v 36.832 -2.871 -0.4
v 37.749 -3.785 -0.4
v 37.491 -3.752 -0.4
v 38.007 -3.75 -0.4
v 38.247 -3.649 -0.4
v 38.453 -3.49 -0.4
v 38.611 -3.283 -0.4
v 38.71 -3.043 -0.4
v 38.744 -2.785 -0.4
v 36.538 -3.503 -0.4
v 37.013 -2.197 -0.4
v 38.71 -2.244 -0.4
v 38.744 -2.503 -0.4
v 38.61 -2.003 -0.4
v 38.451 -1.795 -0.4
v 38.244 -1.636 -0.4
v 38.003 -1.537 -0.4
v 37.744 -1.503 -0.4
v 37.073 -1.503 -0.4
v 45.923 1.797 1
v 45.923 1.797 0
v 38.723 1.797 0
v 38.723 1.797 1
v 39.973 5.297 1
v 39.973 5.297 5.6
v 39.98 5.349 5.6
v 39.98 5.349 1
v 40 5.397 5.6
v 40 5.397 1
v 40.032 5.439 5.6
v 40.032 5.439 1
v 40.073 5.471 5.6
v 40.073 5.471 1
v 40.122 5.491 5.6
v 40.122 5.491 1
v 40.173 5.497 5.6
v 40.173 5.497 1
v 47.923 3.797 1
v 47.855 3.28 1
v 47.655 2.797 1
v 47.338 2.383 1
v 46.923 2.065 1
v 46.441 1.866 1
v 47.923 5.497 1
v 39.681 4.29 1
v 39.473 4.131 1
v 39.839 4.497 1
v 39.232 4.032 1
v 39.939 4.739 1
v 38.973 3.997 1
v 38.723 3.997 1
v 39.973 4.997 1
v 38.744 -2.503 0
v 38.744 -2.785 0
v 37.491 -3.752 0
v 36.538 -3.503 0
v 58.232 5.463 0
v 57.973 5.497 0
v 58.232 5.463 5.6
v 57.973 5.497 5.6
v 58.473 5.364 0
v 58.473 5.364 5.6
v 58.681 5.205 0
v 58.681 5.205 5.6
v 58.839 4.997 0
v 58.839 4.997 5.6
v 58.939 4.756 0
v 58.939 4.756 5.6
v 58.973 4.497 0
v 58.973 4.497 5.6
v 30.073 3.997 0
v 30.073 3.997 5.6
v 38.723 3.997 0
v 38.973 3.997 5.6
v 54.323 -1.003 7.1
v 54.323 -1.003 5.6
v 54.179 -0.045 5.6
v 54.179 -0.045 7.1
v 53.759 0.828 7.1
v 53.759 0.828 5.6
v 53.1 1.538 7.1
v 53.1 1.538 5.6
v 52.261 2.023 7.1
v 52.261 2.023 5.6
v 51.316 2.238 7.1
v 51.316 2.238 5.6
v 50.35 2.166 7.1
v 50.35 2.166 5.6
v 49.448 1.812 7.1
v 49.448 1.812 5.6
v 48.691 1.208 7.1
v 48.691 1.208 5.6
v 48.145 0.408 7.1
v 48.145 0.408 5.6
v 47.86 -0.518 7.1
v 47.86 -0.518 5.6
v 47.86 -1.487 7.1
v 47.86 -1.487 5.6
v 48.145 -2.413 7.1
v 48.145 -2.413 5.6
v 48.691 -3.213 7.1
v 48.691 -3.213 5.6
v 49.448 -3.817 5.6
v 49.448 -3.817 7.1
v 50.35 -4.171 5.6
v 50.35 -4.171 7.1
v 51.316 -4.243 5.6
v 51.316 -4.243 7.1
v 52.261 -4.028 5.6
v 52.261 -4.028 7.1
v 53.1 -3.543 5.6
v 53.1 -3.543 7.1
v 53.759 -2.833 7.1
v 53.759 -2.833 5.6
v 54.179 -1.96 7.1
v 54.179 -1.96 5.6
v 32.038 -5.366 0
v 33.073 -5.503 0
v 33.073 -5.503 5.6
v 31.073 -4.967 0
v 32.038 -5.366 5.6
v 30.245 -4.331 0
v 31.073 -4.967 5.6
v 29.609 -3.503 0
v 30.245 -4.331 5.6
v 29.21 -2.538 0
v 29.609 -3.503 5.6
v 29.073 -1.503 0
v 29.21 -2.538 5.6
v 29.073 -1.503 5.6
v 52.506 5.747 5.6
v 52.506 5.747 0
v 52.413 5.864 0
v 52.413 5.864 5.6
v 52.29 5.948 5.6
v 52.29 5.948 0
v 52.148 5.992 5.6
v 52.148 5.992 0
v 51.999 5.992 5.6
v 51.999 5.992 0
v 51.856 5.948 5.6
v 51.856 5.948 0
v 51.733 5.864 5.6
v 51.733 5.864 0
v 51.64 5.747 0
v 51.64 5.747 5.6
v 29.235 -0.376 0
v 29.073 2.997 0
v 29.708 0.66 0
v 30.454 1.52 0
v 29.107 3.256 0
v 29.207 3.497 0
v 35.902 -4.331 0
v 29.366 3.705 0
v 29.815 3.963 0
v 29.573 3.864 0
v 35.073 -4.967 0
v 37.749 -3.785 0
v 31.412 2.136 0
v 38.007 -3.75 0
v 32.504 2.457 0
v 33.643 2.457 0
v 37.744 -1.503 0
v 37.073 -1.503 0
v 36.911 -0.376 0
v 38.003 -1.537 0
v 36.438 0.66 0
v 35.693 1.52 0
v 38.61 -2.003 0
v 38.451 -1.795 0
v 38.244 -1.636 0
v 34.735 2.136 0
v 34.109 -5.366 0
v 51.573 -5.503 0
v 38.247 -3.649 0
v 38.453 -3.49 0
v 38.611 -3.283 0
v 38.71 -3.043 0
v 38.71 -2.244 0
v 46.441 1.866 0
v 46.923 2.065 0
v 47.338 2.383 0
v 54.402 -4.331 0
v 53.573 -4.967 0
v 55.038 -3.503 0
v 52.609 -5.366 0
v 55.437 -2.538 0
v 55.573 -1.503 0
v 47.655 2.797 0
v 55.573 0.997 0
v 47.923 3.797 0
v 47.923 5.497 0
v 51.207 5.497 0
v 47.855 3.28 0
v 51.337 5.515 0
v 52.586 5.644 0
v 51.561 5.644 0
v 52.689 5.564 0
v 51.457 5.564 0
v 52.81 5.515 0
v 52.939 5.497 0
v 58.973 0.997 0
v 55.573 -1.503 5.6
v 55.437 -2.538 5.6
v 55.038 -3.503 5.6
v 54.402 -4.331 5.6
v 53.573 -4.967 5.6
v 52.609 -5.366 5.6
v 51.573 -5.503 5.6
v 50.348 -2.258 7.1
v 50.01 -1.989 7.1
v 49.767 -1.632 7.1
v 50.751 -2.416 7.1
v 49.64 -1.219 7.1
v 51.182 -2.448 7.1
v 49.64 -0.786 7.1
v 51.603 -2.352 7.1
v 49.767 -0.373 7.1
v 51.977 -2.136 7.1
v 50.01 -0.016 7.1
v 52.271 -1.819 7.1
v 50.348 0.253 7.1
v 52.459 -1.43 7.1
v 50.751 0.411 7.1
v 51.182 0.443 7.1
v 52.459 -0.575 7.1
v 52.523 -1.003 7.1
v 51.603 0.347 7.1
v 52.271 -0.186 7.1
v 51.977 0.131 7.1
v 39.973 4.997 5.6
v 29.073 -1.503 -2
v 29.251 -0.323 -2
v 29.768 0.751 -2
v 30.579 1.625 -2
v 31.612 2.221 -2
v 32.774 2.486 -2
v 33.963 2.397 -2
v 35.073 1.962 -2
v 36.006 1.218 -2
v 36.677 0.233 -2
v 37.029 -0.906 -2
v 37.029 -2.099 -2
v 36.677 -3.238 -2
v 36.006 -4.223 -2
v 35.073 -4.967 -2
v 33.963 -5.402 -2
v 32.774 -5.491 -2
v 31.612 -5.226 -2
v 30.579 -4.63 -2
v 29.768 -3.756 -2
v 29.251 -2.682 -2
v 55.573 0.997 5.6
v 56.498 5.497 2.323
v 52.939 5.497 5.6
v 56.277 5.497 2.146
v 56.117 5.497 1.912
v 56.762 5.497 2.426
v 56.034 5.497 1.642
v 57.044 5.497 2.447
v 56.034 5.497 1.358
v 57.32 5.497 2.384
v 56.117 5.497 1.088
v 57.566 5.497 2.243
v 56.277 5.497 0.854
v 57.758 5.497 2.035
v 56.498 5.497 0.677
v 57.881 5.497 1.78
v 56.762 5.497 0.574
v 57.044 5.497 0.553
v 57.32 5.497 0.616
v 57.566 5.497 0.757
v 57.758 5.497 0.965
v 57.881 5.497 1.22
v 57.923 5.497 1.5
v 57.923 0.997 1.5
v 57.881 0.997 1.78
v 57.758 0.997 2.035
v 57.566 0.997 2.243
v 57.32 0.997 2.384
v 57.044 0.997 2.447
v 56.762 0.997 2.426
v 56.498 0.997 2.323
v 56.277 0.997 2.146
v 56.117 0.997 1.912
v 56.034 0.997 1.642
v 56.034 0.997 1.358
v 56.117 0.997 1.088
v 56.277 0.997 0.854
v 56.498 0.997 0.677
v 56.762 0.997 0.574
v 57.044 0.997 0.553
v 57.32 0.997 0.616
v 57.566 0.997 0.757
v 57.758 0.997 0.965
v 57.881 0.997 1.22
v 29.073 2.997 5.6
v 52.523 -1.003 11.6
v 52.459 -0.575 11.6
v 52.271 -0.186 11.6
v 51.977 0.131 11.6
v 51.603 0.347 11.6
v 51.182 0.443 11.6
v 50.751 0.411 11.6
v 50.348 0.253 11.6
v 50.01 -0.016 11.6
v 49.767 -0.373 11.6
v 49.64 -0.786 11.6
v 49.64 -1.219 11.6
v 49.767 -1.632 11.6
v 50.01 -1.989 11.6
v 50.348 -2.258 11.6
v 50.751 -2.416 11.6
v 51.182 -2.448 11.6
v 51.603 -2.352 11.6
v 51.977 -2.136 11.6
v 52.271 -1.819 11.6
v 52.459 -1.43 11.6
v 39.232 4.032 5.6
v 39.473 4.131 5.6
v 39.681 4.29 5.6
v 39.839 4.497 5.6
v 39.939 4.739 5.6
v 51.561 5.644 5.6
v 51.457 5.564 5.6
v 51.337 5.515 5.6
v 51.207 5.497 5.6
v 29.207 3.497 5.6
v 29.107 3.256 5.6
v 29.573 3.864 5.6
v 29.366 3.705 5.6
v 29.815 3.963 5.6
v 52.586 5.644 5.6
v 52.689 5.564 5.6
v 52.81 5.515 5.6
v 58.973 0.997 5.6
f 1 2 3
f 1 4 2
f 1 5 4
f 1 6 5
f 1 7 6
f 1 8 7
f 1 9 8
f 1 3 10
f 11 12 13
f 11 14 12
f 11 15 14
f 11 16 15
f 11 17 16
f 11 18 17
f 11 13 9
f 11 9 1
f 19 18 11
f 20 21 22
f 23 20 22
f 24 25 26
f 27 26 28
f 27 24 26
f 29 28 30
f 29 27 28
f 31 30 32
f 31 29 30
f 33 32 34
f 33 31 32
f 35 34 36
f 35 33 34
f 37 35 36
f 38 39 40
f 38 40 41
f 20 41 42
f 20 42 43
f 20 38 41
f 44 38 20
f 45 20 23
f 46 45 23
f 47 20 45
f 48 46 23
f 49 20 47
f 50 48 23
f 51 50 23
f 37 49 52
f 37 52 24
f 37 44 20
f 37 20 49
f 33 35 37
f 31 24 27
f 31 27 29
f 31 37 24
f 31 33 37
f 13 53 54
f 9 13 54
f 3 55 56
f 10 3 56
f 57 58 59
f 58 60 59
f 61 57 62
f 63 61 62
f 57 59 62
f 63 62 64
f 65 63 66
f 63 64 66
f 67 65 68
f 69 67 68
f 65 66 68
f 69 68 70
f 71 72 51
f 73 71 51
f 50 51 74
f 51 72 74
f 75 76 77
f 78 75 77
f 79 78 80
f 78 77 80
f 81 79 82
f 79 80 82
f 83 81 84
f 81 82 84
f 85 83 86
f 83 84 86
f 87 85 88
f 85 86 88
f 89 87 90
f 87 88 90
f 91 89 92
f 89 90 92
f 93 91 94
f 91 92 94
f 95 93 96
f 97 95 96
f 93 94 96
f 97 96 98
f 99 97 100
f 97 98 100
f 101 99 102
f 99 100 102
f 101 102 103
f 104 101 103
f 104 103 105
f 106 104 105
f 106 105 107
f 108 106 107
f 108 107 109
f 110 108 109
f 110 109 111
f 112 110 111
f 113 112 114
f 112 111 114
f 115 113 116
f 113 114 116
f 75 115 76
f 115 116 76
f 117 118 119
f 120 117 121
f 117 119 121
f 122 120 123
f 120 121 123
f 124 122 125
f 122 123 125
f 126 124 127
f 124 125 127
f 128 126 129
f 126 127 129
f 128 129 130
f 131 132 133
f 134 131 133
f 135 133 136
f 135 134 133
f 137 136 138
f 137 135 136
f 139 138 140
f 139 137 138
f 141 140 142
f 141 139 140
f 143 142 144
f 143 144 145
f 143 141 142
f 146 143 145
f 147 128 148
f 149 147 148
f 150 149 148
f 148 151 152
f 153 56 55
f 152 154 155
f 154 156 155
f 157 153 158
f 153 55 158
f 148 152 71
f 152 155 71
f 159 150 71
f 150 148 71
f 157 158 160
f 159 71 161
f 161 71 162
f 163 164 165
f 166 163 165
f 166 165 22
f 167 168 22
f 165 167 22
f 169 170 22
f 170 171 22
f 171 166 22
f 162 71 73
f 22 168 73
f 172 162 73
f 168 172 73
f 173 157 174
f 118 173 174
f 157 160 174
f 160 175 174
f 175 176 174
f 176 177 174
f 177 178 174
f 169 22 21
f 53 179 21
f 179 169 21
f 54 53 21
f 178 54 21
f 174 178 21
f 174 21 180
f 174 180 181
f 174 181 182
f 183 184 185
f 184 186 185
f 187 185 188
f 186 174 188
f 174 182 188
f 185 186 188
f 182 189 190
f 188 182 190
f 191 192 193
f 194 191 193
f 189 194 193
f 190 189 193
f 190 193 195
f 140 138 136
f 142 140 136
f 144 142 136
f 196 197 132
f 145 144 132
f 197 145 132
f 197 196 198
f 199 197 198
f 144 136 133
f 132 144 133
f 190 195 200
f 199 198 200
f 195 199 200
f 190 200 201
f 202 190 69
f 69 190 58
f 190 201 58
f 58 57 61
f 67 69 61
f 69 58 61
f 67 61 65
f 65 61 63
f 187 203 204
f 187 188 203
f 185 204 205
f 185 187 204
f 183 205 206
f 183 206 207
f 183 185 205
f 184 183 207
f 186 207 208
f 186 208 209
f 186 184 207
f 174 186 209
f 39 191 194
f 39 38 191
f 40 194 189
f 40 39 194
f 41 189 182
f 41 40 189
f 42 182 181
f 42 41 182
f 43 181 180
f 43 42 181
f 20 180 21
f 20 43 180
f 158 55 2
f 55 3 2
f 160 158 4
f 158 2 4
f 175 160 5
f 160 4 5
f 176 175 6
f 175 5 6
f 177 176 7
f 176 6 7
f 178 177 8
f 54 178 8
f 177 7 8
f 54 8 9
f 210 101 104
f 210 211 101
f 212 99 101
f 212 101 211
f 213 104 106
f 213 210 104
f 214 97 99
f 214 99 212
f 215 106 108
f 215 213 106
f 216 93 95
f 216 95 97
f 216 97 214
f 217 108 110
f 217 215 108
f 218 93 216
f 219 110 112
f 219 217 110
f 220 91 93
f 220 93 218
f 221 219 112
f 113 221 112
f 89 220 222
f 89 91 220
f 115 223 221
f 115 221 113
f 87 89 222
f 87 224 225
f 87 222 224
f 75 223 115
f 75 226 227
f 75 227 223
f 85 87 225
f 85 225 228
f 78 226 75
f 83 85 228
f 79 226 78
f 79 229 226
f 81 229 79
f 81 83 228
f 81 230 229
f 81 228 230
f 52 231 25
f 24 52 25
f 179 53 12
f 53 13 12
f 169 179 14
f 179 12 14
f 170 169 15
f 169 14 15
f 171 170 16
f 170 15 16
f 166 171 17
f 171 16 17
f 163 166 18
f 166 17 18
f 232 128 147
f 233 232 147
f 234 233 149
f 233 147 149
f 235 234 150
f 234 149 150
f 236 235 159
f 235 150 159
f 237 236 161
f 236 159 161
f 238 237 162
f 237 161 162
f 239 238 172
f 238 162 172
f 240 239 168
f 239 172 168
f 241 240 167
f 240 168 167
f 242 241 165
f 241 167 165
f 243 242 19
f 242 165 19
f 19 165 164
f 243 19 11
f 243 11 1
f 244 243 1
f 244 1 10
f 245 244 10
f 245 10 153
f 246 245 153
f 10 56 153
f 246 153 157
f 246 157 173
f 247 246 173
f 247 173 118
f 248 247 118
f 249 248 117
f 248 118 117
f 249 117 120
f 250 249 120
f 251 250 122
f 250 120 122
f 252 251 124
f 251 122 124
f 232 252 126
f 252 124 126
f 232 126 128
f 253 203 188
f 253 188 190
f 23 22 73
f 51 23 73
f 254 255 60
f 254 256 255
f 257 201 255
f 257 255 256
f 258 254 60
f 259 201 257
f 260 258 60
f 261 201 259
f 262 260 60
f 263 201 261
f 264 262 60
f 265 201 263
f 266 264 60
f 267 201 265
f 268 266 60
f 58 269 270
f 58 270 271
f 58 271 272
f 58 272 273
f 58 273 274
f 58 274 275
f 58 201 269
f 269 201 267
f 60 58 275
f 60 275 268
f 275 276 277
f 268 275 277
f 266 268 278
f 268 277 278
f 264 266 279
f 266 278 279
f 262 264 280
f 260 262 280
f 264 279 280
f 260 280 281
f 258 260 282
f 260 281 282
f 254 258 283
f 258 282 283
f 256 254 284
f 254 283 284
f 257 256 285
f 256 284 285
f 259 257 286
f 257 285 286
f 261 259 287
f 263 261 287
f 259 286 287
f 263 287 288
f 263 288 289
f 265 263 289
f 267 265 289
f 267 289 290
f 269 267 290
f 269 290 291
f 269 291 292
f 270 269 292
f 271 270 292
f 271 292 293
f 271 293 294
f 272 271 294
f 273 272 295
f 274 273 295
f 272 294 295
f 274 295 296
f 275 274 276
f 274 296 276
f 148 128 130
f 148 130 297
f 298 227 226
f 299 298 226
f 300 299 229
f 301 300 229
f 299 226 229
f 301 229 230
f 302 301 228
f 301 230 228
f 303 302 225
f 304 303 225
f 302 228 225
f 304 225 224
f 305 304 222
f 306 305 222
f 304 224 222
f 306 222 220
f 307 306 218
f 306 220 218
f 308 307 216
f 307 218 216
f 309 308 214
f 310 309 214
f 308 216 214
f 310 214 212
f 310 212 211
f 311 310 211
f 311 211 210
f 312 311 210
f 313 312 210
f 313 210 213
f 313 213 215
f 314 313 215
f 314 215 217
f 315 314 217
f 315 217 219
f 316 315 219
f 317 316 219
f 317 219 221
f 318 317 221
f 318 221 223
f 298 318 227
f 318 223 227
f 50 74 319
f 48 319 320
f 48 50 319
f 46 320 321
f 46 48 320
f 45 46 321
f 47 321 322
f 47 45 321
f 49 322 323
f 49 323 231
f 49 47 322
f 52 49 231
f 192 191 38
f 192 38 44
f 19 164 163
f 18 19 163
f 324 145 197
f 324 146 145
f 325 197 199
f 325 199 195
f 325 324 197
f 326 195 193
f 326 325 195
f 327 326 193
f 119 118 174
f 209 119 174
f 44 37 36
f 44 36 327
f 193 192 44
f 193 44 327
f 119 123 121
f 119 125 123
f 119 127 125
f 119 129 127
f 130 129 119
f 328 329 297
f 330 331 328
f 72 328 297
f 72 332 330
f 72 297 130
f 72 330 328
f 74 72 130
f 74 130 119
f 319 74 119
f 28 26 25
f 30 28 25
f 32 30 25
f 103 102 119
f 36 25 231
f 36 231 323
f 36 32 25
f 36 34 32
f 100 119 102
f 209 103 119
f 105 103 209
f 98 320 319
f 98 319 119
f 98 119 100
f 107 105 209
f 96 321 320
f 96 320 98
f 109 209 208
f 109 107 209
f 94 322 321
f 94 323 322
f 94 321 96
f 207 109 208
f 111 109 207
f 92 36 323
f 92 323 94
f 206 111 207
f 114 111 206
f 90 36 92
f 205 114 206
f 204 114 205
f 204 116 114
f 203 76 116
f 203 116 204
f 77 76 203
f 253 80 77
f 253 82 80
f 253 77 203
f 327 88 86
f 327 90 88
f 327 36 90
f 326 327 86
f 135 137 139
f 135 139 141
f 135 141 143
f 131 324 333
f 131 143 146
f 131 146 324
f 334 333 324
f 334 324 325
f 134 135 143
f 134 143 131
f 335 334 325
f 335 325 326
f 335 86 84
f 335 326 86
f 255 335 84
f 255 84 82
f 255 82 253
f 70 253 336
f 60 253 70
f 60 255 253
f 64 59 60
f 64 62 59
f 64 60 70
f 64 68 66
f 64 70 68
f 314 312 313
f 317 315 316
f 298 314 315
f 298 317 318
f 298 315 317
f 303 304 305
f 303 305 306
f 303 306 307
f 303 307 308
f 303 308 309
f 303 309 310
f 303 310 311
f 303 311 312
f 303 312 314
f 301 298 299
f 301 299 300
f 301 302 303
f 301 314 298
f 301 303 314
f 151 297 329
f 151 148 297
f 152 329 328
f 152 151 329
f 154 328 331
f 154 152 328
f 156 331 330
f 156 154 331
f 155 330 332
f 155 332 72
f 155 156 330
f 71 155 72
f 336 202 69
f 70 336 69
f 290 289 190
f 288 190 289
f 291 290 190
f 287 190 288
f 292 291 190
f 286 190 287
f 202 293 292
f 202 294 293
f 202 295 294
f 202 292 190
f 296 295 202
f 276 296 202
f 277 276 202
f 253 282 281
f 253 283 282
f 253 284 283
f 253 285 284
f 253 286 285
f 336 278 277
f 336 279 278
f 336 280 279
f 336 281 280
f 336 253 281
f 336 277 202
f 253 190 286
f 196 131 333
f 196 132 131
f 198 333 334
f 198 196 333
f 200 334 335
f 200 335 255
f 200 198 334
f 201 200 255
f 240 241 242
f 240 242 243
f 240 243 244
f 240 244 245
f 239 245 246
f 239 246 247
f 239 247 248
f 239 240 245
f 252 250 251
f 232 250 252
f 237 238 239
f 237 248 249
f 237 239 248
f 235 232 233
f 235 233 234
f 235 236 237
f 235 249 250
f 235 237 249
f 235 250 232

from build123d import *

# Parameters (mm, degrees)
SKETCH1_W           = 29.9
SKETCH1_H           = 11
BOSS_EXTRUDE1_DEPTH = 5.6
SKETCH2_R           = 4
BOSS_EXTRUDE2_DEPTH = 2
CUT_EXTRUDE1_START  = -5.6
CUT_EXTRUDE1_DEPTH  = 5.6
SKETCH5_R           = 3.25
BOSS_EXTRUDE3_DEPTH = 1.5
SKETCH6_R           = 1.45
BOSS_EXTRUDE4_DEPTH = 4.5
SKETCH7_W           = 3.4
SKETCH7_H           = 6.5
CUT_EXTRUDE2_DEPTH  = 5.6
FILLET2_R           = 4
SKETCH8_R           = 0.5
BOSS_EXTRUDE5_DEPTH = 5.6
FILLET3_R           = 0.5
SKETCH9_R           = 0.95
CUT_EXTRUDE3_DEPTH  = 4.5
FILLET5_R           = 1
SKETCH10_W          = 10.9
SKETCH10_H          = 1.5
CUT_EXTRUDE4_DEPTH  = 5.6
FILLET6_R           = 1
FILLET7_R           = 1
FILLET8_R           = 0.2
SKETCH11_W          = 9.2
SKETCH11_H          = 3.7
CUT_EXTRUDE5_DEPTH  = 1
FILLET9_R           = 2
BOSS_EXTRUDE6_DEPTH = 0.4
FILLET10_R          = 1


with BuildPart() as part:
    # Sketch1 → Boss-Extrude1 (new body)
    with BuildSketch(Plane.XY):
        with Locations((44.023400912, -0.002506593)):
            Rectangle(SKETCH1_W, SKETCH1_H)
    extrude(amount=BOSS_EXTRUDE1_DEPTH)

    # Sketch2 → Boss-Extrude2 (add)
    with BuildSketch(Plane(origin=(0, 0, 0), x_dir=(-1, 0, 0), z_dir=(0, 0, -1))):
        with Locations((-33.073400912, -1.502506593)):
            Circle(SKETCH2_R)
    extrude(amount=BOSS_EXTRUDE2_DEPTH)

    # Sketch4 → Cut-Extrude1 (cut)
    with BuildSketch(Plane(origin=(0, 0, 0), x_dir=(-1, 0, 0), z_dir=(0, 0, -1)).offset(CUT_EXTRUDE1_START)):
        with BuildLine():
            Line((-29.073400912, -1.502506593), (-29.073400912, -5.502506593))
            Line((-29.073400912, -5.502506593), (-33.073400912, -5.502506593))
            ThreePointArc((-33.073400912, -5.502506593), (-30.244973787, -4.330933718), (-29.073400912, -1.502506593))
        make_face()
    extrude(amount=CUT_EXTRUDE1_DEPTH, mode=Mode.SUBTRACT)

    # Sketch5 → Boss-Extrude3 (add)
    with BuildSketch(Plane.XY.offset(5.6)):
        with Locations((51.073400912, -1.002506593)):
            Circle(SKETCH5_R)
    extrude(amount=BOSS_EXTRUDE3_DEPTH)

    # Sketch6 → Boss-Extrude4 (add)
    with BuildSketch(Plane.XY.offset(7.1)):
        with Locations((51.073400912, -1.002506593)):
            Circle(SKETCH6_R)
    extrude(amount=BOSS_EXTRUDE4_DEPTH)

    # Sketch7 → Cut-Extrude2 (cut)
    with BuildSketch(Plane.XY.offset(5.6)):
        with Locations((57.273400912, -2.252506593)):
            Rectangle(SKETCH7_W, SKETCH7_H)
    extrude(amount=-CUT_EXTRUDE2_DEPTH, mode=Mode.SUBTRACT)

    # Fillet2
    fillet2_edges = [part.edges().sort_by_distance(p)[0] for p in [
        (55.573400912, -5.502506593, 2.8),
    ]]
    fillet(fillet2_edges, radius=FILLET2_R)

    # Sketch8 → Boss-Extrude5 (add)
    with BuildSketch(Plane.XY.offset(5.6)):
        with Locations((52.073400912, 5.497493407)):
            Circle(SKETCH8_R)
    extrude(amount=-BOSS_EXTRUDE5_DEPTH)

    # Fillet3
    fillet3_edges = [part.edges().sort_by_distance(p)[0] for p in [
        (52.573400912, 5.497493407, 2.8),
        (51.573400912, 5.497493407, 2.8),
    ]]
    fillet(fillet3_edges, radius=FILLET3_R)

    # Sketch9 → Cut-Extrude3 (cut)
    with BuildSketch(Plane.XZ.offset(-0.997493407)):
        with Locations((56.973400912, 1.5)):
            Circle(SKETCH9_R)
    extrude(amount=-CUT_EXTRUDE3_DEPTH, mode=Mode.SUBTRACT)

    # Fillet5
    fillet5_edges = [part.edges().sort_by_distance(p)[0] for p in [
        (58.973400912, 5.497493407, 2.8),
    ]]
    fillet(fillet5_edges, radius=FILLET5_R)

    # Sketch10 → Cut-Extrude4 (cut)
    with BuildSketch(Plane.XY.offset(5.6)):
        with Locations((34.523400912, 4.747493407)):
            Rectangle(SKETCH10_W, SKETCH10_H)
    extrude(amount=-CUT_EXTRUDE4_DEPTH, mode=Mode.SUBTRACT)

    # Fillet6
    fillet6_edges = [part.edges().sort_by_distance(p)[0] for p in [
        (29.073400912, 3.997493407, 2.8),
    ]]
    fillet(fillet6_edges, radius=FILLET6_R)

    # Fillet7
    fillet7_edges = [part.edges().sort_by_distance(p)[0] for p in [
        (39.973400912, 3.997493407, 2.8),
    ]]
    fillet(fillet7_edges, radius=FILLET7_R)

    # Fillet8
    fillet8_edges = [part.edges().sort_by_distance(p)[0] for p in [
        (39.973400912, 5.497493407, 2.8),
    ]]
    fillet(fillet8_edges, radius=FILLET8_R)

    # Sketch11 → Cut-Extrude5 (cut)
    with BuildSketch(Plane(origin=(0, 0, 0), x_dir=(-1, 0, 0), z_dir=(0, 0, -1))):
        with Locations((-43.323400912, 3.647493407)):
            Rectangle(SKETCH11_W, SKETCH11_H)
    extrude(amount=-CUT_EXTRUDE5_DEPTH, mode=Mode.SUBTRACT)

    # Fillet9
    fillet9_edges = [part.edges().sort_by_distance(p)[0] for p in [
        (47.923400912, 1.797493407, 0.5),
    ]]
    fillet(fillet9_edges, radius=FILLET9_R)

    # Sketch12 → Boss-Extrude6 (add)
    with BuildSketch(Plane(origin=(0, 0, 0), x_dir=(-1, 0, 0), z_dir=(0, 0, -1))):
        with BuildLine():
            Line((-37.073400912, -1.502506593), (-38.744359598, -1.502506593))
            Line((-38.744359598, -1.502506593), (-38.744359598, -4.080351874))
            Line((-38.744359598, -4.080351874), (-36.537502527, -3.502506593))
            ThreePointArc((-36.537502527, -3.502506593), (-36.937104217, -2.537782773), (-37.073400912, -1.502506593))
        make_face()
    extrude(amount=BOSS_EXTRUDE6_DEPTH)

    # Fillet10
    fillet10_edges = [part.edges().sort_by_distance(p)[0] for p in [
        (38.744359598, -1.502506593, -0.2),
        (38.744359598, -4.080351874, -0.2),
    ]]
    fillet(fillet10_edges, radius=FILLET10_R)


solid = part.part
